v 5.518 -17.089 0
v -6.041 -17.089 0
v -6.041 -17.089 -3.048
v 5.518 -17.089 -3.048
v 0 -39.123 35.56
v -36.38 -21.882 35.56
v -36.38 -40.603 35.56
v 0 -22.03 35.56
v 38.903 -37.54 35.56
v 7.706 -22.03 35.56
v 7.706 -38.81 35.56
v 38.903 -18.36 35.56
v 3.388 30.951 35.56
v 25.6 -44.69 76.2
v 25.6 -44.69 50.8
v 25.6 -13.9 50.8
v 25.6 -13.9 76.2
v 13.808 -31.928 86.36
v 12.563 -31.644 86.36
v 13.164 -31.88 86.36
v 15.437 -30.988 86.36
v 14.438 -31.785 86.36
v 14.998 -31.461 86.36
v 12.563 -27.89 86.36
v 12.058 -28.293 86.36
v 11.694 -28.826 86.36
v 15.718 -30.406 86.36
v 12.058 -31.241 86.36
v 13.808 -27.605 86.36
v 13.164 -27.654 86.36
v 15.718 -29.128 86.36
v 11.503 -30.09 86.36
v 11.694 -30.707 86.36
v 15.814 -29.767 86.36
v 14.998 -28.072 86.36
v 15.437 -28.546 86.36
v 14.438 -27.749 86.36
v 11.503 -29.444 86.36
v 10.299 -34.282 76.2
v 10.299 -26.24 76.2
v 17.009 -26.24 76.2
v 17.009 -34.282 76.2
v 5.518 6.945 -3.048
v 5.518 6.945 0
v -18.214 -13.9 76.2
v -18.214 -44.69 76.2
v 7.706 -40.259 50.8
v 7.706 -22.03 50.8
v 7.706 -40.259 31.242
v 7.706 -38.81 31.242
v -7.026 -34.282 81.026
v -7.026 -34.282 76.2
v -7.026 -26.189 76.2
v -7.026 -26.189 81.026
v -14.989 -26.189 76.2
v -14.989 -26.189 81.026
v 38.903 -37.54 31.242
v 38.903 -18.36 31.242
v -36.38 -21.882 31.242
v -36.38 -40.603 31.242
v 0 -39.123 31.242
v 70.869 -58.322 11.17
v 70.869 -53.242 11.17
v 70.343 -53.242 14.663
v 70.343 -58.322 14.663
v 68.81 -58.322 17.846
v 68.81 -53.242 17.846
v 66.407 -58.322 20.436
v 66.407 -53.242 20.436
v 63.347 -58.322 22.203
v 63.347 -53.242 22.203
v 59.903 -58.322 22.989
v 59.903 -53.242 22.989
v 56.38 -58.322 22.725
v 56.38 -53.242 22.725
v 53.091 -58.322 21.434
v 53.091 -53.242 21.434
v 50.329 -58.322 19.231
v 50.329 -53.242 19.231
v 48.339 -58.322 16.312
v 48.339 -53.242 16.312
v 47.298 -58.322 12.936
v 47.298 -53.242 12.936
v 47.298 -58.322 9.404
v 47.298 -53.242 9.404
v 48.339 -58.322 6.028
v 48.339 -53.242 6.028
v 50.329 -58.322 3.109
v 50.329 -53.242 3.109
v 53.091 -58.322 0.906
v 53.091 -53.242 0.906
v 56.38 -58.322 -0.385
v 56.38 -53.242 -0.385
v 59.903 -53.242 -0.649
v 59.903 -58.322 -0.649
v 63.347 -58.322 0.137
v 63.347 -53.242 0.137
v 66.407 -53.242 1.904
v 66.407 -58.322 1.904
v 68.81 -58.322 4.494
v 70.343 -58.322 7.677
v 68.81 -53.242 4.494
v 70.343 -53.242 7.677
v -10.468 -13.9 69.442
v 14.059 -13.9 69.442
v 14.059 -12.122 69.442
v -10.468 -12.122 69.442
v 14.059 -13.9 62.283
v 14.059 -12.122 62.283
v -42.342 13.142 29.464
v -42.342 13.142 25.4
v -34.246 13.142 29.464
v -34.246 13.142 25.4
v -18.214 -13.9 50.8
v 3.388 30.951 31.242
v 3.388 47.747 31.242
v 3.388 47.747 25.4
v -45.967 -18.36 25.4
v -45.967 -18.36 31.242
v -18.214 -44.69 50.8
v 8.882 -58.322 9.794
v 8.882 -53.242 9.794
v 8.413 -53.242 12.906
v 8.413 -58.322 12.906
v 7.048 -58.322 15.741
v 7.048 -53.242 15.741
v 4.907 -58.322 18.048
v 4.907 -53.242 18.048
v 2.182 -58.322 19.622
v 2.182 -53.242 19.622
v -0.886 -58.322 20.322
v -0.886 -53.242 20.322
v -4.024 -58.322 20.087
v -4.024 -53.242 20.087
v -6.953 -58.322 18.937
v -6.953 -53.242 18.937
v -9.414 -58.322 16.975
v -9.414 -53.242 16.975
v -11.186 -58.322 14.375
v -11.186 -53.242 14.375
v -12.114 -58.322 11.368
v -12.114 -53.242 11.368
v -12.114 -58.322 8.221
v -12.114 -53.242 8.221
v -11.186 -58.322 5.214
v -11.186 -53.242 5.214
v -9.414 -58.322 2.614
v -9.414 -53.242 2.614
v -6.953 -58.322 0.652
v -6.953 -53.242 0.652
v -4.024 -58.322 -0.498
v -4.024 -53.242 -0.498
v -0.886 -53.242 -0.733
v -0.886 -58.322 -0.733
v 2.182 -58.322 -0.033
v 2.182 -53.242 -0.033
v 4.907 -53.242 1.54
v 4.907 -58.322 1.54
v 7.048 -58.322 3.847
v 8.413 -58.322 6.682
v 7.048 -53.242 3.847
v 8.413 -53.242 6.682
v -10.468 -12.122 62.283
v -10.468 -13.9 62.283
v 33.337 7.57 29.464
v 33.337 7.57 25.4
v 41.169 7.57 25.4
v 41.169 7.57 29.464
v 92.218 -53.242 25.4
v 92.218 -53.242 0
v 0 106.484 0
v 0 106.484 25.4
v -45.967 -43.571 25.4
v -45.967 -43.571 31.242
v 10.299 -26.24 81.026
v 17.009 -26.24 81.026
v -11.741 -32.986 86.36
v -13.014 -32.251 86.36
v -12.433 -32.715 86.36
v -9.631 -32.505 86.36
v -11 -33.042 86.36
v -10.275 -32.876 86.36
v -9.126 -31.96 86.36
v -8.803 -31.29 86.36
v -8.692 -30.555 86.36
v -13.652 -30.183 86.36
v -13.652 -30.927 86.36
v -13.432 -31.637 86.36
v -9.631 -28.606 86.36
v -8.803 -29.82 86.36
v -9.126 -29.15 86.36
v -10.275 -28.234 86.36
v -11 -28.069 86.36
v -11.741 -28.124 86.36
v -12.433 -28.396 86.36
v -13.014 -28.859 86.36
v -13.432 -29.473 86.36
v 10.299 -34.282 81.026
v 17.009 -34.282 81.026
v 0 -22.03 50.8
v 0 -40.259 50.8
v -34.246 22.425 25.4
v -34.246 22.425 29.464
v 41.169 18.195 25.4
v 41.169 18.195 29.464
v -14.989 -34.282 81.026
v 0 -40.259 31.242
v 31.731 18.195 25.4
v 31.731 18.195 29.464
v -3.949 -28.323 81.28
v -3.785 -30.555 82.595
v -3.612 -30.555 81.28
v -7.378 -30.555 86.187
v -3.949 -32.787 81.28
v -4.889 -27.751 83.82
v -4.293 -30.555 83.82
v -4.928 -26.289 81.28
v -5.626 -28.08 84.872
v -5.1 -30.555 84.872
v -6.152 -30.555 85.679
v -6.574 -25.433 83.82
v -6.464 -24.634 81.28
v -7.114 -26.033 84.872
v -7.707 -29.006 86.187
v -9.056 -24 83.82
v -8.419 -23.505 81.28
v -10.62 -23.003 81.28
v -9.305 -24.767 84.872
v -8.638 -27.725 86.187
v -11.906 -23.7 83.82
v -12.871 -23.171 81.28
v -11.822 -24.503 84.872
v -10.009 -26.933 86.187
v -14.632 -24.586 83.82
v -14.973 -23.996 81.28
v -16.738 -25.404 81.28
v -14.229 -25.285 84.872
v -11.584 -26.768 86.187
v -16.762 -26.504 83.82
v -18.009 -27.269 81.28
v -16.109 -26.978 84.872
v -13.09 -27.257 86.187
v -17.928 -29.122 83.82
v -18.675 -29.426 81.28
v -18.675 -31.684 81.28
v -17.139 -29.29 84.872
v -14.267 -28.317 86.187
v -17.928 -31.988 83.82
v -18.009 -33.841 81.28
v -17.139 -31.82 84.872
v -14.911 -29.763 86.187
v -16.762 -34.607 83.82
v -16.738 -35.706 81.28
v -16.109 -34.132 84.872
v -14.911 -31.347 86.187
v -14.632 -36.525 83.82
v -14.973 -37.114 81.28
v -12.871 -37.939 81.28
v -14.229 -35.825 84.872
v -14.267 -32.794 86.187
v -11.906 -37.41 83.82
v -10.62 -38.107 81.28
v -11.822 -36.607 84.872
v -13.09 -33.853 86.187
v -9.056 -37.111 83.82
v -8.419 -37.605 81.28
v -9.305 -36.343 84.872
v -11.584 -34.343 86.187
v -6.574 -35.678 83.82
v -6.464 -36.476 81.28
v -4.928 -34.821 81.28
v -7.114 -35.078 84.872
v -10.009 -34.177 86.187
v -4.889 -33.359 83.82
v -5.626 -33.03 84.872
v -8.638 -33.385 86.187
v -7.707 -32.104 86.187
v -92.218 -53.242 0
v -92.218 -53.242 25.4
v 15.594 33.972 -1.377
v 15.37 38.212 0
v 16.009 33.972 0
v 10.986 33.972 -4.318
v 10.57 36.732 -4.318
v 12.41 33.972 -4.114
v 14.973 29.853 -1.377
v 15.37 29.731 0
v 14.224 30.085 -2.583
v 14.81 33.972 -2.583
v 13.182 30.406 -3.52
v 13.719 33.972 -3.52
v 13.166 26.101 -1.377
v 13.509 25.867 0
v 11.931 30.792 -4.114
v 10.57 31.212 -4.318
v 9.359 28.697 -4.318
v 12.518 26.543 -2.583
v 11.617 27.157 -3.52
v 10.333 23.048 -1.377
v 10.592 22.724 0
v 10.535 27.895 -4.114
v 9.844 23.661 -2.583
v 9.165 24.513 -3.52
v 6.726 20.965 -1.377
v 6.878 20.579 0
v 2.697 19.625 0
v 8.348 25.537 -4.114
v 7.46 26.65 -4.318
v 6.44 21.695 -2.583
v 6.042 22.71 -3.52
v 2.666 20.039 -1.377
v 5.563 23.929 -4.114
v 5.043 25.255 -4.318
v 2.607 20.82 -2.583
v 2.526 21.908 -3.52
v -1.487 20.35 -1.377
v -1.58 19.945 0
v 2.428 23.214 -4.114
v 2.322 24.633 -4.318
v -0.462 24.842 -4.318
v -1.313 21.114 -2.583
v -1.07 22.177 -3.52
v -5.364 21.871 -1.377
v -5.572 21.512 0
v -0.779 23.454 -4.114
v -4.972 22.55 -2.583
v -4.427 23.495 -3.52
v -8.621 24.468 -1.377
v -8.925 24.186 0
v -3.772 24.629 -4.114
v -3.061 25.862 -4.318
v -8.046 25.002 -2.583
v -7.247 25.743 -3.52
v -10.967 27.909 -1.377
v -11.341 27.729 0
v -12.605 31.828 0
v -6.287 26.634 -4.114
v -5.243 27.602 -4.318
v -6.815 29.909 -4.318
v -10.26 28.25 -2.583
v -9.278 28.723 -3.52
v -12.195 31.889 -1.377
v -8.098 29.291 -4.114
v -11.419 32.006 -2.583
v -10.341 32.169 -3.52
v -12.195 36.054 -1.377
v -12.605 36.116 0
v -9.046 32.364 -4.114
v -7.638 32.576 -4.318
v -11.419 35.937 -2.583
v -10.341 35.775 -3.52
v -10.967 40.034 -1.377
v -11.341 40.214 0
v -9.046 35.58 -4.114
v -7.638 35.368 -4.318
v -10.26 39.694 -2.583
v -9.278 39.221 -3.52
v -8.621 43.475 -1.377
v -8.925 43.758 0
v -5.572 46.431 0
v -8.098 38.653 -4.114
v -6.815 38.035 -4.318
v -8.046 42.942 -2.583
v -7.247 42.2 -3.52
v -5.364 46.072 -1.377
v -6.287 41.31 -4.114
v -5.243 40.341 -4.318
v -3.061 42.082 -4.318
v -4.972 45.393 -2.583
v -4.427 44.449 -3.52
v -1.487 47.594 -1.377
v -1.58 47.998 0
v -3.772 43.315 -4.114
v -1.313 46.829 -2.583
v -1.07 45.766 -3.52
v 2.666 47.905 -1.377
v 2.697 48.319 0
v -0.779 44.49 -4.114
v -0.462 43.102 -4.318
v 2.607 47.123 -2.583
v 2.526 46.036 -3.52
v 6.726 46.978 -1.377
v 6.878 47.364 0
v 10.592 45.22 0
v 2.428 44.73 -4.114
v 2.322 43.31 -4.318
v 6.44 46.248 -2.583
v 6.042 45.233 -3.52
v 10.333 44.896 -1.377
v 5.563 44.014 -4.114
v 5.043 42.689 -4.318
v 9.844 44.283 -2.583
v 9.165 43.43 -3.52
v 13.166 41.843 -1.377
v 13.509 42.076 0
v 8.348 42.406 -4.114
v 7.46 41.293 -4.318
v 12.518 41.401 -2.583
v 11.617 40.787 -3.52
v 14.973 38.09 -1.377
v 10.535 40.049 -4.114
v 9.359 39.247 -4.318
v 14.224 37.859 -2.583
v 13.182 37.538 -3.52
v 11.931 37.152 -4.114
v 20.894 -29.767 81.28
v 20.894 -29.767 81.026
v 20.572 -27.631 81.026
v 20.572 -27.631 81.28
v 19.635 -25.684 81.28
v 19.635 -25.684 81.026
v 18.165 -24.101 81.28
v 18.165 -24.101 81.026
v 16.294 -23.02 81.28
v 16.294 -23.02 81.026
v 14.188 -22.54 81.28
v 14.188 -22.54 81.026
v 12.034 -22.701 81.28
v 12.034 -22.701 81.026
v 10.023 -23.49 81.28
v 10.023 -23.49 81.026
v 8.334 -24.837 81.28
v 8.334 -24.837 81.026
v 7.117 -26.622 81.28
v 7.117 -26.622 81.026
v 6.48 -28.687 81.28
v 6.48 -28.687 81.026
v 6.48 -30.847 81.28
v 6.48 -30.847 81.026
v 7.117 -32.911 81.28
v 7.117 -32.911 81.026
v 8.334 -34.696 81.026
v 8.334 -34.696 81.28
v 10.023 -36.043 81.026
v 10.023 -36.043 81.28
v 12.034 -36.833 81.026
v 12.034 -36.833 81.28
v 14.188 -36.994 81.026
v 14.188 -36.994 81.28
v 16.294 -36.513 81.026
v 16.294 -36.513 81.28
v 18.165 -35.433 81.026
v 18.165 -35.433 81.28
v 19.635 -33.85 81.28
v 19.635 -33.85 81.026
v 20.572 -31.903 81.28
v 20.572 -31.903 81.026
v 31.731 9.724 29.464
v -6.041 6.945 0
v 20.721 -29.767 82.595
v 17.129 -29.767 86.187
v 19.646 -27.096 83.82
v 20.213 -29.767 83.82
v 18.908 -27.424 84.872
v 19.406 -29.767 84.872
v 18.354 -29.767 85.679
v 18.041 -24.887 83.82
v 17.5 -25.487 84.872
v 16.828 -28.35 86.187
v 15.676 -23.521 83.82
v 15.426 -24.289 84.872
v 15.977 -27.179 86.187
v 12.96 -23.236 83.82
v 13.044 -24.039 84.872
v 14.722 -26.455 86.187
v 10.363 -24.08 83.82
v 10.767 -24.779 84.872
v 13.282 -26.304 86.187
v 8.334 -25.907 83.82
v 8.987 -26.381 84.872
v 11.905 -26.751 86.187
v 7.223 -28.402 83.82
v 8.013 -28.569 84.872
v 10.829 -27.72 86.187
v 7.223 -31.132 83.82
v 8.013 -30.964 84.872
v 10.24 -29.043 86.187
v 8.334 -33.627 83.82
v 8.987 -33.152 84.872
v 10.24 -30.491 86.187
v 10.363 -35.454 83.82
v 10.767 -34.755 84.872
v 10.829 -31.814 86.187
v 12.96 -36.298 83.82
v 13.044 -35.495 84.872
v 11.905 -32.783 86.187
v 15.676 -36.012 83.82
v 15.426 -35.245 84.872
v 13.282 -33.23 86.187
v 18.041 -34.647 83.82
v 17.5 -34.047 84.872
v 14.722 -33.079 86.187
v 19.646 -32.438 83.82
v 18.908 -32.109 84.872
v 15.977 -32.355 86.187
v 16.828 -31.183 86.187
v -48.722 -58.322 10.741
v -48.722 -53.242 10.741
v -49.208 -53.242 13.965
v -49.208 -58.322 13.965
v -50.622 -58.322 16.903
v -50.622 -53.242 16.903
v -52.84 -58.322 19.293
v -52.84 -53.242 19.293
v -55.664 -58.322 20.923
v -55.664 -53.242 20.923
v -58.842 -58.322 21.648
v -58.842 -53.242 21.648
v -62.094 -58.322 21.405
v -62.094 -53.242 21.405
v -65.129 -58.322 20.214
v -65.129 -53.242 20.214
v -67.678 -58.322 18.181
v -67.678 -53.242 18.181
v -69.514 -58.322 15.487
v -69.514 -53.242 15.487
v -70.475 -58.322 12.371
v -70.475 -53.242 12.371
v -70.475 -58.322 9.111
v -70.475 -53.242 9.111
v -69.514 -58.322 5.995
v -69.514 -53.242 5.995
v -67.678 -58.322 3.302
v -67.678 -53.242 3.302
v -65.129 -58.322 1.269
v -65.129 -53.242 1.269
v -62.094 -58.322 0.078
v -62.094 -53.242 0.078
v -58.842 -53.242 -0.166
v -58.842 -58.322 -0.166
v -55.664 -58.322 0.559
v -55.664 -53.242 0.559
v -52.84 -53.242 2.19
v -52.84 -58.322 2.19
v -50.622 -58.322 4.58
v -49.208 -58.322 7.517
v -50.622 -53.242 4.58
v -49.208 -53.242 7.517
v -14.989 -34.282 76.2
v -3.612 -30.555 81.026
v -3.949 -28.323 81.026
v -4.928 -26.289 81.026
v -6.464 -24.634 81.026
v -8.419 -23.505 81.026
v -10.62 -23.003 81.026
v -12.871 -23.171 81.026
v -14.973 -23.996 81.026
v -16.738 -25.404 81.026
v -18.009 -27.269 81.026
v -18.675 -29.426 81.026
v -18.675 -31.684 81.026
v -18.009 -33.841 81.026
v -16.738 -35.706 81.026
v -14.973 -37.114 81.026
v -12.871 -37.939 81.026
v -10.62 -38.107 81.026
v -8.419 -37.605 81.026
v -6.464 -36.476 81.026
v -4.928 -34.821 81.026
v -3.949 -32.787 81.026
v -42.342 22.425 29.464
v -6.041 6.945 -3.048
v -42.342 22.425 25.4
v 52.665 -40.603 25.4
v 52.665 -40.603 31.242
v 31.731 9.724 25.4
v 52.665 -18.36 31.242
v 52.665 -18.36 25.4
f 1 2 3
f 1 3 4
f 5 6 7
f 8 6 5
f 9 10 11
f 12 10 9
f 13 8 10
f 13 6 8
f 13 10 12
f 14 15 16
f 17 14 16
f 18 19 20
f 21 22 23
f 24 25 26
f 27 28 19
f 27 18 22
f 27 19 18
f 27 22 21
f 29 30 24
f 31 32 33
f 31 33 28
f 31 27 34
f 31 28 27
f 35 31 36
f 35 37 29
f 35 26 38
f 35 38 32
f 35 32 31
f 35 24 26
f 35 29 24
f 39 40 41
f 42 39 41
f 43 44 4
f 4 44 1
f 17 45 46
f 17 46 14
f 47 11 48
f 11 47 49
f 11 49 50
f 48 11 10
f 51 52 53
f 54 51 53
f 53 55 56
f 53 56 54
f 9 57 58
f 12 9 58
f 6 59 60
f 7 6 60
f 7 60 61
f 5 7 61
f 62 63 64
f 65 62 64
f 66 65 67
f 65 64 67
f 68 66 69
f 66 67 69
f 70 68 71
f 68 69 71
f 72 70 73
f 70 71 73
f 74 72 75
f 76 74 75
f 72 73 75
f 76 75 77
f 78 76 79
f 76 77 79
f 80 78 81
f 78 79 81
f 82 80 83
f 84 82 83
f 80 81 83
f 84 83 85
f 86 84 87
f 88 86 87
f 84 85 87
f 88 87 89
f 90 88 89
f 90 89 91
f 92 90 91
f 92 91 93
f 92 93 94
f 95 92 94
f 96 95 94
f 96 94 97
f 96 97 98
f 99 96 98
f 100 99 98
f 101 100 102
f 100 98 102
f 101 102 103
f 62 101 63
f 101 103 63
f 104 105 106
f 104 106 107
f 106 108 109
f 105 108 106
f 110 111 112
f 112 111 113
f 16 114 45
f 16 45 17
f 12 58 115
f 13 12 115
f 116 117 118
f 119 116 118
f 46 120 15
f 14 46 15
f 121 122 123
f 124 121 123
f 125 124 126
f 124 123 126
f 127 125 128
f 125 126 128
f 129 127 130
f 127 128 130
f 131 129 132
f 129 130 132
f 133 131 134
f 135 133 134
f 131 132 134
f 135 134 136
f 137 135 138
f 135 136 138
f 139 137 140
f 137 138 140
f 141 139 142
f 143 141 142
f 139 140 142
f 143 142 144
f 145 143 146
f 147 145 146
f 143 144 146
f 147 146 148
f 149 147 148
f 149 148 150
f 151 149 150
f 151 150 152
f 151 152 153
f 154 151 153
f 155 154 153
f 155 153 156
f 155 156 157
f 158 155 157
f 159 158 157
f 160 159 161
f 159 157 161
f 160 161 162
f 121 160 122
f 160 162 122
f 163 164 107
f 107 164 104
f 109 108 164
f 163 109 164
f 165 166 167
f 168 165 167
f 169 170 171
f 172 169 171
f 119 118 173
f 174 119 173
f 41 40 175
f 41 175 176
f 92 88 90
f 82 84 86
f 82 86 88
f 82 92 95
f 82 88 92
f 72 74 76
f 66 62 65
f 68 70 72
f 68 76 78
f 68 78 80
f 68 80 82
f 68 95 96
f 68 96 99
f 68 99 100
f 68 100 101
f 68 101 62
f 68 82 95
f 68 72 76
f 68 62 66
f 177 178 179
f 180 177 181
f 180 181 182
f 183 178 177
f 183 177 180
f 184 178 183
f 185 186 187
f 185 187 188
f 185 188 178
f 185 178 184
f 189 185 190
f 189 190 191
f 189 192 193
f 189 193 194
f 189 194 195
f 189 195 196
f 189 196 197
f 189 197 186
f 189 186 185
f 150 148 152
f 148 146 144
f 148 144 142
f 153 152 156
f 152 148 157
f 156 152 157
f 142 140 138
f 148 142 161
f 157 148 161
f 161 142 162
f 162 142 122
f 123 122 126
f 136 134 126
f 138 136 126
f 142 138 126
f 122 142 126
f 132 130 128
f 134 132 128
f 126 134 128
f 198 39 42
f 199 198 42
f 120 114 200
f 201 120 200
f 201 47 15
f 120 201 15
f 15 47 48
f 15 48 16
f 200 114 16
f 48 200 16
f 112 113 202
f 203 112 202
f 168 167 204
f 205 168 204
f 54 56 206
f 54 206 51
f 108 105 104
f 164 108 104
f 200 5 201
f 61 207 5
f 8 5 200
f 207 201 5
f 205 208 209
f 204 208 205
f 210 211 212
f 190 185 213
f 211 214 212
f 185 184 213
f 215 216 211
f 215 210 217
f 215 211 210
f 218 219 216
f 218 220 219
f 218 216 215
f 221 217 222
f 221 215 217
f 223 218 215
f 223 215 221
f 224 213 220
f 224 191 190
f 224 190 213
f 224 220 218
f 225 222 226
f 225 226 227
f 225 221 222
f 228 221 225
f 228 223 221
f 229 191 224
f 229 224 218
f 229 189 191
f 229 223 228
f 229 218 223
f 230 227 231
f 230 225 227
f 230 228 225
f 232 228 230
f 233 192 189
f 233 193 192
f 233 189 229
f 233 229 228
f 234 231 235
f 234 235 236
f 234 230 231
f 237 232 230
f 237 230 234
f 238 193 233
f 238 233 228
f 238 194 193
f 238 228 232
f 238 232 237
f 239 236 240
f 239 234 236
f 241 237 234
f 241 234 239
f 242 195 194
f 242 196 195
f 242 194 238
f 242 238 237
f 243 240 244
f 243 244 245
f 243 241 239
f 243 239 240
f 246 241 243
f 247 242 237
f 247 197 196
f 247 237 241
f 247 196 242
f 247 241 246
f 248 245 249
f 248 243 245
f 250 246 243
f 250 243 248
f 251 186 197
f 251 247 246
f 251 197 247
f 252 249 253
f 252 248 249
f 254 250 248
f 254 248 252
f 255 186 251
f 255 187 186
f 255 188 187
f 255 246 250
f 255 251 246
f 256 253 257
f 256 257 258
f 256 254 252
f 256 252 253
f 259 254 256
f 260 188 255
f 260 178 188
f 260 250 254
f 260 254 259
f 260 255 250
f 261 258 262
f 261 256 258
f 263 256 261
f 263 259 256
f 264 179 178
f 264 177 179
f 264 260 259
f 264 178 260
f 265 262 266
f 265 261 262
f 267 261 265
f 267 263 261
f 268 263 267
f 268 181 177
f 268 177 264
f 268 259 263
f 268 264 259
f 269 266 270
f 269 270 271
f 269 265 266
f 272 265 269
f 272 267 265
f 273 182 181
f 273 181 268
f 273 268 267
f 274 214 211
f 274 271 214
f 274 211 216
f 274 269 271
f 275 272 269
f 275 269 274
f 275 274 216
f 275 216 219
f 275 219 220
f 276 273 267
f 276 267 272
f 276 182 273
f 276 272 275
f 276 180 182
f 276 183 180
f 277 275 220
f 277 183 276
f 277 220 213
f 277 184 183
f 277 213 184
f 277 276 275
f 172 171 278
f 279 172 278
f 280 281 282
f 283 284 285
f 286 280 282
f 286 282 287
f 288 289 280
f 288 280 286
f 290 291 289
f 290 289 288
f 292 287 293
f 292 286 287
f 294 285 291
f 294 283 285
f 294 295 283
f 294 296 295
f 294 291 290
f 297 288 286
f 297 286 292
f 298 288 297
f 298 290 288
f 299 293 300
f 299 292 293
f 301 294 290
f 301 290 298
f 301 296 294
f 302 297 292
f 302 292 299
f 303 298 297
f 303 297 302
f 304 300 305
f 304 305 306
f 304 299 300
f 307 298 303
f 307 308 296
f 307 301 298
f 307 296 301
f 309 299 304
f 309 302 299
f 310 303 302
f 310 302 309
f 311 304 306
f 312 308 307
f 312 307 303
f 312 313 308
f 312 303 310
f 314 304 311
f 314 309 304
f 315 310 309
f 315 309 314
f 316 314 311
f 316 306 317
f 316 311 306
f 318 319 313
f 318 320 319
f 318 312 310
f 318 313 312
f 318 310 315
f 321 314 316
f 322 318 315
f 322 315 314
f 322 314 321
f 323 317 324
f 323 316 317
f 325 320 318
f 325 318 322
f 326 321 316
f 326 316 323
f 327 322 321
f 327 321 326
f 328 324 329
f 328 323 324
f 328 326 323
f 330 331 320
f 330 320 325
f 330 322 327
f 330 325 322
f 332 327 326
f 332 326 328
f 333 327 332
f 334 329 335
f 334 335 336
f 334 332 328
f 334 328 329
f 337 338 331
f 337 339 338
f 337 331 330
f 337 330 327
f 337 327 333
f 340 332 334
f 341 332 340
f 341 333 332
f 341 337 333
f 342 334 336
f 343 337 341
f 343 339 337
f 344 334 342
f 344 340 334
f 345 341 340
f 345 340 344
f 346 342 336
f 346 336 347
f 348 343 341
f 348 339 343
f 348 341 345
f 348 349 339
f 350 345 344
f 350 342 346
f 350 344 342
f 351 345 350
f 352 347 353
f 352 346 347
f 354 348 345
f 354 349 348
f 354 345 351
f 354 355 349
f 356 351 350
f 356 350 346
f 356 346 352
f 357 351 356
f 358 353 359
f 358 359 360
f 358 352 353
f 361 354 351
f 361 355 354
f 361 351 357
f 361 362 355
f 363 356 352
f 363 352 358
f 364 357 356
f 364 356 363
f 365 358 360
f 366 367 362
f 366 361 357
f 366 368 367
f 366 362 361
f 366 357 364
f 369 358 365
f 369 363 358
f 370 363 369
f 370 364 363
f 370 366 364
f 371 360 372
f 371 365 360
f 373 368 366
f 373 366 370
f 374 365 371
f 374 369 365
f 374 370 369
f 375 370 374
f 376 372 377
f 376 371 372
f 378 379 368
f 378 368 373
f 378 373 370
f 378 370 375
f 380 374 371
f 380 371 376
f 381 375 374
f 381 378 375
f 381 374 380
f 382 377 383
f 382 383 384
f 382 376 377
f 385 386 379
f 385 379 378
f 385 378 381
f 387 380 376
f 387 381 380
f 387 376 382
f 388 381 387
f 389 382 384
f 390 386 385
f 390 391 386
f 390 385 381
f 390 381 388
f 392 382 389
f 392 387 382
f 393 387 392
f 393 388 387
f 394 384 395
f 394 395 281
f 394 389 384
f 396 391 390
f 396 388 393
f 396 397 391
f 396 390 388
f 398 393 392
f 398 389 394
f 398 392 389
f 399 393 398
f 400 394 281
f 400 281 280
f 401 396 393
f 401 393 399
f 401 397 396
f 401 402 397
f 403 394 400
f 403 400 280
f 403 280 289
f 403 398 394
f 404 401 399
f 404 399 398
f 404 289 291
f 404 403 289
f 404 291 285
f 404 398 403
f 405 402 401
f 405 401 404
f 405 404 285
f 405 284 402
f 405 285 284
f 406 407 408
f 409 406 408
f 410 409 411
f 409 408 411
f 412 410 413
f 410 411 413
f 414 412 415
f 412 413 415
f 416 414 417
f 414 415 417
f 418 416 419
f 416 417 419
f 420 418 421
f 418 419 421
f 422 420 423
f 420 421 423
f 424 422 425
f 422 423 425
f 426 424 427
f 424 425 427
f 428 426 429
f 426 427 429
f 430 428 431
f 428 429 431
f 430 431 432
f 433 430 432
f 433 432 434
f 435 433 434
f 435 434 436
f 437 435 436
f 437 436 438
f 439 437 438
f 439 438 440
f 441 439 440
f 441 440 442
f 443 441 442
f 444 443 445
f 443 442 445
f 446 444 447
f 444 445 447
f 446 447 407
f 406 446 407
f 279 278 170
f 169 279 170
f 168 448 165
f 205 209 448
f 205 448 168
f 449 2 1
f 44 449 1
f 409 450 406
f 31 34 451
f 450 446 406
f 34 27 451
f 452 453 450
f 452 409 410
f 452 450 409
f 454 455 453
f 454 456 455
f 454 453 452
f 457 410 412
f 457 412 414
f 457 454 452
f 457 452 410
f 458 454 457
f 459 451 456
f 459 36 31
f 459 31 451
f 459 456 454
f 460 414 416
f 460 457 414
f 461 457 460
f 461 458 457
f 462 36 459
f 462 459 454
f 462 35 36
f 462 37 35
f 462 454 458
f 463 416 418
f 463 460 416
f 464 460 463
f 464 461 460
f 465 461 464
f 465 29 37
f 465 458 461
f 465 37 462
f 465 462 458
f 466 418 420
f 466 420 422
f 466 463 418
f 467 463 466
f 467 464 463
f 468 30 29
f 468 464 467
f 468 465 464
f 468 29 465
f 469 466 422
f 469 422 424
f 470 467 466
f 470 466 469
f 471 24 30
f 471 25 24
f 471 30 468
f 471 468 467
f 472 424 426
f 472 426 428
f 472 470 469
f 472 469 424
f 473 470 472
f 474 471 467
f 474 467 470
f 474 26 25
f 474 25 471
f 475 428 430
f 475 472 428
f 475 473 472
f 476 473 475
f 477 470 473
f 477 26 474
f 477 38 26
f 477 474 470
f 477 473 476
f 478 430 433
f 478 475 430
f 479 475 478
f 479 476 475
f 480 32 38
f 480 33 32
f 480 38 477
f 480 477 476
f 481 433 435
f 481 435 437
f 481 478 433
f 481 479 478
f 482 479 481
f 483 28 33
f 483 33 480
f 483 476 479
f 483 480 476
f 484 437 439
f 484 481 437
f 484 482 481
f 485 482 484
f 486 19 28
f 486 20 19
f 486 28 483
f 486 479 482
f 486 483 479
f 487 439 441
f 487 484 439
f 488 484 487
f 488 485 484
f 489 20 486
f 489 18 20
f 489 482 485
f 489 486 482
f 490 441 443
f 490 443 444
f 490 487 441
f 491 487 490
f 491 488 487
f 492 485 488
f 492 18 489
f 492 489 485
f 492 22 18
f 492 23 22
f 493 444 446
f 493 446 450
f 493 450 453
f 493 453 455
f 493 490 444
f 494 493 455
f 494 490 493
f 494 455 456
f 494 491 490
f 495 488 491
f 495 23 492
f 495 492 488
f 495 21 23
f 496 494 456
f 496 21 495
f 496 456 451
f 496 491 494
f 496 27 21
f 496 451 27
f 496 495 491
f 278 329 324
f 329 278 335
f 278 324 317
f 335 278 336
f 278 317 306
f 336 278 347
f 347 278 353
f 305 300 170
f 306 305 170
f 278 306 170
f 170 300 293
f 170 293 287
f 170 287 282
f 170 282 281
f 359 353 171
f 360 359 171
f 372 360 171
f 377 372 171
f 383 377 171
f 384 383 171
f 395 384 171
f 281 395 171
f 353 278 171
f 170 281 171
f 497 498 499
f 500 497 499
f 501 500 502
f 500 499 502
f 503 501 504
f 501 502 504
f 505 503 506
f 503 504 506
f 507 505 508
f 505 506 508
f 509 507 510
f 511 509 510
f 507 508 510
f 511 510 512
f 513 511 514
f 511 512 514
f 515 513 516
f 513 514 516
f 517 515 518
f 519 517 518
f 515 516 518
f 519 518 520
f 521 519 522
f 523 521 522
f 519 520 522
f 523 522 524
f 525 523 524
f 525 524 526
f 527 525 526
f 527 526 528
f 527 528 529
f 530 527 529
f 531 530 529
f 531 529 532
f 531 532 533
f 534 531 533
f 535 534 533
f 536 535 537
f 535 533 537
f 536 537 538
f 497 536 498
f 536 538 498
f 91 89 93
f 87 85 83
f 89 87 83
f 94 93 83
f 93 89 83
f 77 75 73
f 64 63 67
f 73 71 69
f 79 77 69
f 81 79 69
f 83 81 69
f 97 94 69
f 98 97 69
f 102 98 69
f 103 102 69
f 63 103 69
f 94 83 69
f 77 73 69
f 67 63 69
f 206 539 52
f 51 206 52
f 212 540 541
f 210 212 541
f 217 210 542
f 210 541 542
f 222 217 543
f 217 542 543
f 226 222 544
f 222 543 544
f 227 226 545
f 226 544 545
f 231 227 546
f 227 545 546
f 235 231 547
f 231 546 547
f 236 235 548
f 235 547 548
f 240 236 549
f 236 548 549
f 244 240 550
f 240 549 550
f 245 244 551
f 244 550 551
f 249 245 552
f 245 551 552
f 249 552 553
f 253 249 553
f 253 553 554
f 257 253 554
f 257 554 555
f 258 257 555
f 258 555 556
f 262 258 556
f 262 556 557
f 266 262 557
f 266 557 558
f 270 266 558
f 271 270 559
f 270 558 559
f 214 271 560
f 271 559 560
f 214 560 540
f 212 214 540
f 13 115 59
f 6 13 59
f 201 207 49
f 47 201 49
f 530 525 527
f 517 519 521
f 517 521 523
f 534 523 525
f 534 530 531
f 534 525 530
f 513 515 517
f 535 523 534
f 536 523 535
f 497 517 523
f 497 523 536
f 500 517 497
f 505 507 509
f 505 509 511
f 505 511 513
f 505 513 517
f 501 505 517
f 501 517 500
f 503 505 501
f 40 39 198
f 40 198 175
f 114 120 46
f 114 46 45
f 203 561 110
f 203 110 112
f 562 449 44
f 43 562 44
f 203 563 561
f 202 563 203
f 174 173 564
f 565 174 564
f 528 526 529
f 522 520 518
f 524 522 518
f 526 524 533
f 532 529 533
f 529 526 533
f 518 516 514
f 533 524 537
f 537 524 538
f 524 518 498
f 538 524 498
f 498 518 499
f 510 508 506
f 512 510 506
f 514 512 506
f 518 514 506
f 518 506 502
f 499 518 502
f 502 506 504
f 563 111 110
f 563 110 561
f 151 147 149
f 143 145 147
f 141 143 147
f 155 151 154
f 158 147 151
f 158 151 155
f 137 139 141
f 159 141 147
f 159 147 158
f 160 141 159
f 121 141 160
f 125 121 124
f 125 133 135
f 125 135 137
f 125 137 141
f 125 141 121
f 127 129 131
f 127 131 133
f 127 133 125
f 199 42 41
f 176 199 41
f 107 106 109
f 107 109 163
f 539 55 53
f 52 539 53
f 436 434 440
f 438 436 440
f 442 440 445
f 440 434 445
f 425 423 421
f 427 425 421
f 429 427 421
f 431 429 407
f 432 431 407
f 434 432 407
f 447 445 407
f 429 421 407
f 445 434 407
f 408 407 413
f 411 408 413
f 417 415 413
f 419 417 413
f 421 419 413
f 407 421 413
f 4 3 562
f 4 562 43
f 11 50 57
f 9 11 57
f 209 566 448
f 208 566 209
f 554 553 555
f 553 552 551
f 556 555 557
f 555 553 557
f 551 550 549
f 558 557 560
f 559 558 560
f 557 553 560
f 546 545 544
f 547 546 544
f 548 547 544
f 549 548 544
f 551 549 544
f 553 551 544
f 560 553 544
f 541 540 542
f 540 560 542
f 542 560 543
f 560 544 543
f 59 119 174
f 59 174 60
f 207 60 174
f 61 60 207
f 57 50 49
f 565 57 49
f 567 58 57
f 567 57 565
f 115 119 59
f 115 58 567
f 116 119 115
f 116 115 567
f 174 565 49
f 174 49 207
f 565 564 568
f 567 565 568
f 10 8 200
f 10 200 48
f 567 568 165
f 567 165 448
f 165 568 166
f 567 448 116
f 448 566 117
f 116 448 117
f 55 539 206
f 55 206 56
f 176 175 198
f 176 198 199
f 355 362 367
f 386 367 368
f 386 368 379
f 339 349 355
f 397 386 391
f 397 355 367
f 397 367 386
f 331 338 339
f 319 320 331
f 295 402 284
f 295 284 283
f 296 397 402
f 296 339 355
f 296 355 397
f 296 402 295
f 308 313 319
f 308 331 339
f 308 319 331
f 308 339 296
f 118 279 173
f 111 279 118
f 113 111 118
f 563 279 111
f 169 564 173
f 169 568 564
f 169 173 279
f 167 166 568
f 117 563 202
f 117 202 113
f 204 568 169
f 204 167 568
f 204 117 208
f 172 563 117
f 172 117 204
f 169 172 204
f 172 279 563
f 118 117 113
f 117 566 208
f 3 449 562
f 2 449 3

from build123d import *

# Parameters (mm, degrees)
F1_DEPTH  = 25.4
F2_W      = 7.7060335316
F2_H      = 18.2289350778
F3_DEPTH  = 25.4
F4_W      = 43.813964352
F4_H      = 30.7902917266
F5_DEPTH  = 25.4
F7_DEPTH  = 5.842
F9_DEPTH  = 4.318
F10_R     = 10.9377694976
F11_DEPTH = 5.08
F10_R_2   = 10.5571366777
F10_R_3   = 11.8519516329
F12_W     = 11.5590882488
F12_H     = 24.0346593782
F13_DEPTH = 3.048
F14_R     = 14.3871232907
F15_DEPTH = 4.318
F17_W     = 24.5277062058
F17_H     = 7.1590915322
F18_DEPTH = 1.778
F19_W     = 8.0961622298
F19_H     = 9.2830331996
F19_W_2   = 9.4388686121
F19_H_2   = 10.6246345676
F20_DEPTH = 4.064
F21_W     = 6.7095533013
F21_H     = 8.0418605357
F22_DEPTH = 4.826
F21_W_2   = 7.9630683176
F21_H_2   = 8.0924835056
F23_R     = 7.24746932
F24_DEPTH = 5.334
F23_R_2   = 7.57353882
F25_R     = 5.08
F26_R     = 5.08


# Not quite as in the source:
# - a fillet or chamfer that OpenCascade refuses, or shapes differently, is made with other operations: its cross-section is extruded or revolved along the edge and cut away or added


with BuildPart() as f1:
    # F0 (on Top) → F1 (new body)
    with BuildSketch(Plane.XY):
        Polygon((-92.2177294153, -53.241930902), (92.2177294153, -53.241930902), (0, 106.483861804), align=None)
    extrude(amount=F1_DEPTH)

    # F2 (on face) → F3 (join)
    with BuildSketch(Plane.XY.offset(25.4)):
        with Locations((3.8530167658, -31.1447037384)):
            Rectangle(F2_W, F2_H)
    extrude(amount=F3_DEPTH)

    # F4 (on face) → F5 (join)
    with BuildSketch(Plane.XY.offset(50.8)):
        with Locations((3.692750819, -29.2946621776)):
            Rectangle(F4_W, F4_H)
    extrude(amount=F5_DEPTH)

    # F6 (on face) → F7 (join)
    with BuildSketch(Plane.XY.offset(25.4)):
        Polygon((-45.9667816758, -43.5710027814), (52.6651255786, -40.6033433974), (52.6651255786, -18.3600392193), (3.388244193, 47.7468930185), (-45.9667816758, -18.3600392193), align=None)
    extrude(amount=F7_DEPTH)

    # F8 (on face) → F9 (join)
    with BuildSketch(Plane.XY.offset(31.242)):
        Polygon((-36.3797843456, -40.6033433974), (38.902554661, -37.5404730439), (38.902554661, -18.3600392193), (3.388244193, 30.9511683881), (-36.3797843456, -21.8821838498), align=None)
    extrude(amount=F9_DEPTH)

    # F14 (on face) → F15 (join)
    with BuildSketch(Plane(origin=(0, 0, 0), x_dir=(1, 0, 0), z_dir=(0, 0, -1))):
        with Locations((1.6217207303, -33.9718163013)):
            Circle(F14_R)
    extrude(amount=F15_DEPTH)

    # F16: fillet of radius 5.08 on 1 edges, made by hand

    # F16_s1 → F16_t2 (revolve, cut)
    with BuildSketch(Plane.XZ.offset(-33.9718163013)):
        with BuildLine():
            ThreePointArc((16.008844021, 0), (14.2980739798, -3.0901007256), (10.986319158, -4.318))
            Line((10.986319158, -4.318), (16.008844021, -4.318))
            Line((16.008844021, -4.318), (16.008844021, 0))
        make_face()
    revolve(axis=Axis((1.6217207303, 33.9718163013, -4.318), (0, 0, -1)), mode=Mode.SUBTRACT)

    # F19 (on face) → F20 (join)
    with BuildSketch(Plane.XY.offset(25.4)):
        with Locations((-38.2937844843, 17.7833898924)):
            Rectangle(F19_W, F19_H)
        with Locations((36.4500377327, 12.8823302221)):
            Rectangle(F19_W_2, F19_H_2)
    extrude(amount=F20_DEPTH)


with BuildPart() as f11:
    # F10 (on face) → F11 (new body)
    with BuildSketch(Plane.XZ.offset(53.241930902)):
        with Locations((-59.6596300602, 10.7411490753)):
            Circle(F10_R)
    extrude(amount=F11_DEPTH)


with BuildPart() as f11b:
    # F10 (on face) → F11, piece 2 (new body)
    with BuildSketch(Plane.XZ.offset(53.241930902)):
        with Locations((-1.674802741, 9.7942696884)):
            Circle(F10_R_2)
    extrude(amount=F11_DEPTH)


with BuildPart() as f11c:
    # F10 (on face) → F11, piece 3 (new body)
    with BuildSketch(Plane.XZ.offset(53.241930902)):
        with Locations((59.0170994401, 11.1700361595)):
            Circle(F10_R_3)
    extrude(amount=F11_DEPTH)


with BuildPart() as f13:
    # F12 (on face) → F13 (new body)
    with BuildSketch(Plane(origin=(0, 0, 0), x_dir=(1, 0, 0), z_dir=(0, 0, -1))):
        with Locations((-0.2612734679, 5.0718975253)):
            Rectangle(F12_W, F12_H)
    extrude(amount=F13_DEPTH)


with BuildPart() as f18:
    # F17 (on face) → F18 (new body)
    with BuildSketch(Plane(origin=(0, -13.8995163143, 0), x_dir=(-1, 0, 0), z_dir=(0, 1, 0))):
        with Locations((-1.7953896895, 65.8626444638)):
            Rectangle(F17_W, F17_H)
    extrude(amount=F18_DEPTH)


with BuildPart() as f22:
    # F21 (on face) → F22 (new body)
    with BuildSketch(Plane.XY.offset(76.2)):
        with Locations((13.6541202664, -30.2609531209)):
            Rectangle(F21_W, F21_H)
    extrude(amount=F22_DEPTH)


with BuildPart() as f22b:
    # F21 (on face) → F22, piece 2 (new body)
    with BuildSketch(Plane.XY.offset(76.2)):
        with Locations((-11.0076835845, -30.235641636)):
            Rectangle(F21_W_2, F21_H_2)
    extrude(amount=F22_DEPTH)


with BuildPart() as f24:
    # F23 (on face) → F24 (new body)
    with BuildSketch(Plane.XY.offset(81.026)):
        with Locations((13.6464145035, -29.7668650746)):
            Circle(F23_R)
    extrude(amount=F24_DEPTH)

    # F26
    f26_edges = [f24.edges().sort_by_distance(p)[0] for p in [
        (6.398945, -29.766865, 86.36),
    ]]
    fillet(f26_edges, radius=F26_R)


with BuildPart() as f24b:
    # F23 (on face) → F24, piece 2 (new body)
    with BuildSketch(Plane.XY.offset(81.026)):
        with Locations((-11.1858844757, -30.5551066995)):
            Circle(F23_R_2)
    extrude(amount=F24_DEPTH)

    # F25
    f25_edges = [f24b.edges().sort_by_distance(p)[0] for p in [
        (-18.759423, -30.555107, 86.36),
    ]]
    fillet(f25_edges, radius=F25_R)


solid = Compound([f1.part, f11.part, f11b.part, f11c.part, f13.part, f18.part, f22.part, f22b.part, f24.part, f24b.part])
